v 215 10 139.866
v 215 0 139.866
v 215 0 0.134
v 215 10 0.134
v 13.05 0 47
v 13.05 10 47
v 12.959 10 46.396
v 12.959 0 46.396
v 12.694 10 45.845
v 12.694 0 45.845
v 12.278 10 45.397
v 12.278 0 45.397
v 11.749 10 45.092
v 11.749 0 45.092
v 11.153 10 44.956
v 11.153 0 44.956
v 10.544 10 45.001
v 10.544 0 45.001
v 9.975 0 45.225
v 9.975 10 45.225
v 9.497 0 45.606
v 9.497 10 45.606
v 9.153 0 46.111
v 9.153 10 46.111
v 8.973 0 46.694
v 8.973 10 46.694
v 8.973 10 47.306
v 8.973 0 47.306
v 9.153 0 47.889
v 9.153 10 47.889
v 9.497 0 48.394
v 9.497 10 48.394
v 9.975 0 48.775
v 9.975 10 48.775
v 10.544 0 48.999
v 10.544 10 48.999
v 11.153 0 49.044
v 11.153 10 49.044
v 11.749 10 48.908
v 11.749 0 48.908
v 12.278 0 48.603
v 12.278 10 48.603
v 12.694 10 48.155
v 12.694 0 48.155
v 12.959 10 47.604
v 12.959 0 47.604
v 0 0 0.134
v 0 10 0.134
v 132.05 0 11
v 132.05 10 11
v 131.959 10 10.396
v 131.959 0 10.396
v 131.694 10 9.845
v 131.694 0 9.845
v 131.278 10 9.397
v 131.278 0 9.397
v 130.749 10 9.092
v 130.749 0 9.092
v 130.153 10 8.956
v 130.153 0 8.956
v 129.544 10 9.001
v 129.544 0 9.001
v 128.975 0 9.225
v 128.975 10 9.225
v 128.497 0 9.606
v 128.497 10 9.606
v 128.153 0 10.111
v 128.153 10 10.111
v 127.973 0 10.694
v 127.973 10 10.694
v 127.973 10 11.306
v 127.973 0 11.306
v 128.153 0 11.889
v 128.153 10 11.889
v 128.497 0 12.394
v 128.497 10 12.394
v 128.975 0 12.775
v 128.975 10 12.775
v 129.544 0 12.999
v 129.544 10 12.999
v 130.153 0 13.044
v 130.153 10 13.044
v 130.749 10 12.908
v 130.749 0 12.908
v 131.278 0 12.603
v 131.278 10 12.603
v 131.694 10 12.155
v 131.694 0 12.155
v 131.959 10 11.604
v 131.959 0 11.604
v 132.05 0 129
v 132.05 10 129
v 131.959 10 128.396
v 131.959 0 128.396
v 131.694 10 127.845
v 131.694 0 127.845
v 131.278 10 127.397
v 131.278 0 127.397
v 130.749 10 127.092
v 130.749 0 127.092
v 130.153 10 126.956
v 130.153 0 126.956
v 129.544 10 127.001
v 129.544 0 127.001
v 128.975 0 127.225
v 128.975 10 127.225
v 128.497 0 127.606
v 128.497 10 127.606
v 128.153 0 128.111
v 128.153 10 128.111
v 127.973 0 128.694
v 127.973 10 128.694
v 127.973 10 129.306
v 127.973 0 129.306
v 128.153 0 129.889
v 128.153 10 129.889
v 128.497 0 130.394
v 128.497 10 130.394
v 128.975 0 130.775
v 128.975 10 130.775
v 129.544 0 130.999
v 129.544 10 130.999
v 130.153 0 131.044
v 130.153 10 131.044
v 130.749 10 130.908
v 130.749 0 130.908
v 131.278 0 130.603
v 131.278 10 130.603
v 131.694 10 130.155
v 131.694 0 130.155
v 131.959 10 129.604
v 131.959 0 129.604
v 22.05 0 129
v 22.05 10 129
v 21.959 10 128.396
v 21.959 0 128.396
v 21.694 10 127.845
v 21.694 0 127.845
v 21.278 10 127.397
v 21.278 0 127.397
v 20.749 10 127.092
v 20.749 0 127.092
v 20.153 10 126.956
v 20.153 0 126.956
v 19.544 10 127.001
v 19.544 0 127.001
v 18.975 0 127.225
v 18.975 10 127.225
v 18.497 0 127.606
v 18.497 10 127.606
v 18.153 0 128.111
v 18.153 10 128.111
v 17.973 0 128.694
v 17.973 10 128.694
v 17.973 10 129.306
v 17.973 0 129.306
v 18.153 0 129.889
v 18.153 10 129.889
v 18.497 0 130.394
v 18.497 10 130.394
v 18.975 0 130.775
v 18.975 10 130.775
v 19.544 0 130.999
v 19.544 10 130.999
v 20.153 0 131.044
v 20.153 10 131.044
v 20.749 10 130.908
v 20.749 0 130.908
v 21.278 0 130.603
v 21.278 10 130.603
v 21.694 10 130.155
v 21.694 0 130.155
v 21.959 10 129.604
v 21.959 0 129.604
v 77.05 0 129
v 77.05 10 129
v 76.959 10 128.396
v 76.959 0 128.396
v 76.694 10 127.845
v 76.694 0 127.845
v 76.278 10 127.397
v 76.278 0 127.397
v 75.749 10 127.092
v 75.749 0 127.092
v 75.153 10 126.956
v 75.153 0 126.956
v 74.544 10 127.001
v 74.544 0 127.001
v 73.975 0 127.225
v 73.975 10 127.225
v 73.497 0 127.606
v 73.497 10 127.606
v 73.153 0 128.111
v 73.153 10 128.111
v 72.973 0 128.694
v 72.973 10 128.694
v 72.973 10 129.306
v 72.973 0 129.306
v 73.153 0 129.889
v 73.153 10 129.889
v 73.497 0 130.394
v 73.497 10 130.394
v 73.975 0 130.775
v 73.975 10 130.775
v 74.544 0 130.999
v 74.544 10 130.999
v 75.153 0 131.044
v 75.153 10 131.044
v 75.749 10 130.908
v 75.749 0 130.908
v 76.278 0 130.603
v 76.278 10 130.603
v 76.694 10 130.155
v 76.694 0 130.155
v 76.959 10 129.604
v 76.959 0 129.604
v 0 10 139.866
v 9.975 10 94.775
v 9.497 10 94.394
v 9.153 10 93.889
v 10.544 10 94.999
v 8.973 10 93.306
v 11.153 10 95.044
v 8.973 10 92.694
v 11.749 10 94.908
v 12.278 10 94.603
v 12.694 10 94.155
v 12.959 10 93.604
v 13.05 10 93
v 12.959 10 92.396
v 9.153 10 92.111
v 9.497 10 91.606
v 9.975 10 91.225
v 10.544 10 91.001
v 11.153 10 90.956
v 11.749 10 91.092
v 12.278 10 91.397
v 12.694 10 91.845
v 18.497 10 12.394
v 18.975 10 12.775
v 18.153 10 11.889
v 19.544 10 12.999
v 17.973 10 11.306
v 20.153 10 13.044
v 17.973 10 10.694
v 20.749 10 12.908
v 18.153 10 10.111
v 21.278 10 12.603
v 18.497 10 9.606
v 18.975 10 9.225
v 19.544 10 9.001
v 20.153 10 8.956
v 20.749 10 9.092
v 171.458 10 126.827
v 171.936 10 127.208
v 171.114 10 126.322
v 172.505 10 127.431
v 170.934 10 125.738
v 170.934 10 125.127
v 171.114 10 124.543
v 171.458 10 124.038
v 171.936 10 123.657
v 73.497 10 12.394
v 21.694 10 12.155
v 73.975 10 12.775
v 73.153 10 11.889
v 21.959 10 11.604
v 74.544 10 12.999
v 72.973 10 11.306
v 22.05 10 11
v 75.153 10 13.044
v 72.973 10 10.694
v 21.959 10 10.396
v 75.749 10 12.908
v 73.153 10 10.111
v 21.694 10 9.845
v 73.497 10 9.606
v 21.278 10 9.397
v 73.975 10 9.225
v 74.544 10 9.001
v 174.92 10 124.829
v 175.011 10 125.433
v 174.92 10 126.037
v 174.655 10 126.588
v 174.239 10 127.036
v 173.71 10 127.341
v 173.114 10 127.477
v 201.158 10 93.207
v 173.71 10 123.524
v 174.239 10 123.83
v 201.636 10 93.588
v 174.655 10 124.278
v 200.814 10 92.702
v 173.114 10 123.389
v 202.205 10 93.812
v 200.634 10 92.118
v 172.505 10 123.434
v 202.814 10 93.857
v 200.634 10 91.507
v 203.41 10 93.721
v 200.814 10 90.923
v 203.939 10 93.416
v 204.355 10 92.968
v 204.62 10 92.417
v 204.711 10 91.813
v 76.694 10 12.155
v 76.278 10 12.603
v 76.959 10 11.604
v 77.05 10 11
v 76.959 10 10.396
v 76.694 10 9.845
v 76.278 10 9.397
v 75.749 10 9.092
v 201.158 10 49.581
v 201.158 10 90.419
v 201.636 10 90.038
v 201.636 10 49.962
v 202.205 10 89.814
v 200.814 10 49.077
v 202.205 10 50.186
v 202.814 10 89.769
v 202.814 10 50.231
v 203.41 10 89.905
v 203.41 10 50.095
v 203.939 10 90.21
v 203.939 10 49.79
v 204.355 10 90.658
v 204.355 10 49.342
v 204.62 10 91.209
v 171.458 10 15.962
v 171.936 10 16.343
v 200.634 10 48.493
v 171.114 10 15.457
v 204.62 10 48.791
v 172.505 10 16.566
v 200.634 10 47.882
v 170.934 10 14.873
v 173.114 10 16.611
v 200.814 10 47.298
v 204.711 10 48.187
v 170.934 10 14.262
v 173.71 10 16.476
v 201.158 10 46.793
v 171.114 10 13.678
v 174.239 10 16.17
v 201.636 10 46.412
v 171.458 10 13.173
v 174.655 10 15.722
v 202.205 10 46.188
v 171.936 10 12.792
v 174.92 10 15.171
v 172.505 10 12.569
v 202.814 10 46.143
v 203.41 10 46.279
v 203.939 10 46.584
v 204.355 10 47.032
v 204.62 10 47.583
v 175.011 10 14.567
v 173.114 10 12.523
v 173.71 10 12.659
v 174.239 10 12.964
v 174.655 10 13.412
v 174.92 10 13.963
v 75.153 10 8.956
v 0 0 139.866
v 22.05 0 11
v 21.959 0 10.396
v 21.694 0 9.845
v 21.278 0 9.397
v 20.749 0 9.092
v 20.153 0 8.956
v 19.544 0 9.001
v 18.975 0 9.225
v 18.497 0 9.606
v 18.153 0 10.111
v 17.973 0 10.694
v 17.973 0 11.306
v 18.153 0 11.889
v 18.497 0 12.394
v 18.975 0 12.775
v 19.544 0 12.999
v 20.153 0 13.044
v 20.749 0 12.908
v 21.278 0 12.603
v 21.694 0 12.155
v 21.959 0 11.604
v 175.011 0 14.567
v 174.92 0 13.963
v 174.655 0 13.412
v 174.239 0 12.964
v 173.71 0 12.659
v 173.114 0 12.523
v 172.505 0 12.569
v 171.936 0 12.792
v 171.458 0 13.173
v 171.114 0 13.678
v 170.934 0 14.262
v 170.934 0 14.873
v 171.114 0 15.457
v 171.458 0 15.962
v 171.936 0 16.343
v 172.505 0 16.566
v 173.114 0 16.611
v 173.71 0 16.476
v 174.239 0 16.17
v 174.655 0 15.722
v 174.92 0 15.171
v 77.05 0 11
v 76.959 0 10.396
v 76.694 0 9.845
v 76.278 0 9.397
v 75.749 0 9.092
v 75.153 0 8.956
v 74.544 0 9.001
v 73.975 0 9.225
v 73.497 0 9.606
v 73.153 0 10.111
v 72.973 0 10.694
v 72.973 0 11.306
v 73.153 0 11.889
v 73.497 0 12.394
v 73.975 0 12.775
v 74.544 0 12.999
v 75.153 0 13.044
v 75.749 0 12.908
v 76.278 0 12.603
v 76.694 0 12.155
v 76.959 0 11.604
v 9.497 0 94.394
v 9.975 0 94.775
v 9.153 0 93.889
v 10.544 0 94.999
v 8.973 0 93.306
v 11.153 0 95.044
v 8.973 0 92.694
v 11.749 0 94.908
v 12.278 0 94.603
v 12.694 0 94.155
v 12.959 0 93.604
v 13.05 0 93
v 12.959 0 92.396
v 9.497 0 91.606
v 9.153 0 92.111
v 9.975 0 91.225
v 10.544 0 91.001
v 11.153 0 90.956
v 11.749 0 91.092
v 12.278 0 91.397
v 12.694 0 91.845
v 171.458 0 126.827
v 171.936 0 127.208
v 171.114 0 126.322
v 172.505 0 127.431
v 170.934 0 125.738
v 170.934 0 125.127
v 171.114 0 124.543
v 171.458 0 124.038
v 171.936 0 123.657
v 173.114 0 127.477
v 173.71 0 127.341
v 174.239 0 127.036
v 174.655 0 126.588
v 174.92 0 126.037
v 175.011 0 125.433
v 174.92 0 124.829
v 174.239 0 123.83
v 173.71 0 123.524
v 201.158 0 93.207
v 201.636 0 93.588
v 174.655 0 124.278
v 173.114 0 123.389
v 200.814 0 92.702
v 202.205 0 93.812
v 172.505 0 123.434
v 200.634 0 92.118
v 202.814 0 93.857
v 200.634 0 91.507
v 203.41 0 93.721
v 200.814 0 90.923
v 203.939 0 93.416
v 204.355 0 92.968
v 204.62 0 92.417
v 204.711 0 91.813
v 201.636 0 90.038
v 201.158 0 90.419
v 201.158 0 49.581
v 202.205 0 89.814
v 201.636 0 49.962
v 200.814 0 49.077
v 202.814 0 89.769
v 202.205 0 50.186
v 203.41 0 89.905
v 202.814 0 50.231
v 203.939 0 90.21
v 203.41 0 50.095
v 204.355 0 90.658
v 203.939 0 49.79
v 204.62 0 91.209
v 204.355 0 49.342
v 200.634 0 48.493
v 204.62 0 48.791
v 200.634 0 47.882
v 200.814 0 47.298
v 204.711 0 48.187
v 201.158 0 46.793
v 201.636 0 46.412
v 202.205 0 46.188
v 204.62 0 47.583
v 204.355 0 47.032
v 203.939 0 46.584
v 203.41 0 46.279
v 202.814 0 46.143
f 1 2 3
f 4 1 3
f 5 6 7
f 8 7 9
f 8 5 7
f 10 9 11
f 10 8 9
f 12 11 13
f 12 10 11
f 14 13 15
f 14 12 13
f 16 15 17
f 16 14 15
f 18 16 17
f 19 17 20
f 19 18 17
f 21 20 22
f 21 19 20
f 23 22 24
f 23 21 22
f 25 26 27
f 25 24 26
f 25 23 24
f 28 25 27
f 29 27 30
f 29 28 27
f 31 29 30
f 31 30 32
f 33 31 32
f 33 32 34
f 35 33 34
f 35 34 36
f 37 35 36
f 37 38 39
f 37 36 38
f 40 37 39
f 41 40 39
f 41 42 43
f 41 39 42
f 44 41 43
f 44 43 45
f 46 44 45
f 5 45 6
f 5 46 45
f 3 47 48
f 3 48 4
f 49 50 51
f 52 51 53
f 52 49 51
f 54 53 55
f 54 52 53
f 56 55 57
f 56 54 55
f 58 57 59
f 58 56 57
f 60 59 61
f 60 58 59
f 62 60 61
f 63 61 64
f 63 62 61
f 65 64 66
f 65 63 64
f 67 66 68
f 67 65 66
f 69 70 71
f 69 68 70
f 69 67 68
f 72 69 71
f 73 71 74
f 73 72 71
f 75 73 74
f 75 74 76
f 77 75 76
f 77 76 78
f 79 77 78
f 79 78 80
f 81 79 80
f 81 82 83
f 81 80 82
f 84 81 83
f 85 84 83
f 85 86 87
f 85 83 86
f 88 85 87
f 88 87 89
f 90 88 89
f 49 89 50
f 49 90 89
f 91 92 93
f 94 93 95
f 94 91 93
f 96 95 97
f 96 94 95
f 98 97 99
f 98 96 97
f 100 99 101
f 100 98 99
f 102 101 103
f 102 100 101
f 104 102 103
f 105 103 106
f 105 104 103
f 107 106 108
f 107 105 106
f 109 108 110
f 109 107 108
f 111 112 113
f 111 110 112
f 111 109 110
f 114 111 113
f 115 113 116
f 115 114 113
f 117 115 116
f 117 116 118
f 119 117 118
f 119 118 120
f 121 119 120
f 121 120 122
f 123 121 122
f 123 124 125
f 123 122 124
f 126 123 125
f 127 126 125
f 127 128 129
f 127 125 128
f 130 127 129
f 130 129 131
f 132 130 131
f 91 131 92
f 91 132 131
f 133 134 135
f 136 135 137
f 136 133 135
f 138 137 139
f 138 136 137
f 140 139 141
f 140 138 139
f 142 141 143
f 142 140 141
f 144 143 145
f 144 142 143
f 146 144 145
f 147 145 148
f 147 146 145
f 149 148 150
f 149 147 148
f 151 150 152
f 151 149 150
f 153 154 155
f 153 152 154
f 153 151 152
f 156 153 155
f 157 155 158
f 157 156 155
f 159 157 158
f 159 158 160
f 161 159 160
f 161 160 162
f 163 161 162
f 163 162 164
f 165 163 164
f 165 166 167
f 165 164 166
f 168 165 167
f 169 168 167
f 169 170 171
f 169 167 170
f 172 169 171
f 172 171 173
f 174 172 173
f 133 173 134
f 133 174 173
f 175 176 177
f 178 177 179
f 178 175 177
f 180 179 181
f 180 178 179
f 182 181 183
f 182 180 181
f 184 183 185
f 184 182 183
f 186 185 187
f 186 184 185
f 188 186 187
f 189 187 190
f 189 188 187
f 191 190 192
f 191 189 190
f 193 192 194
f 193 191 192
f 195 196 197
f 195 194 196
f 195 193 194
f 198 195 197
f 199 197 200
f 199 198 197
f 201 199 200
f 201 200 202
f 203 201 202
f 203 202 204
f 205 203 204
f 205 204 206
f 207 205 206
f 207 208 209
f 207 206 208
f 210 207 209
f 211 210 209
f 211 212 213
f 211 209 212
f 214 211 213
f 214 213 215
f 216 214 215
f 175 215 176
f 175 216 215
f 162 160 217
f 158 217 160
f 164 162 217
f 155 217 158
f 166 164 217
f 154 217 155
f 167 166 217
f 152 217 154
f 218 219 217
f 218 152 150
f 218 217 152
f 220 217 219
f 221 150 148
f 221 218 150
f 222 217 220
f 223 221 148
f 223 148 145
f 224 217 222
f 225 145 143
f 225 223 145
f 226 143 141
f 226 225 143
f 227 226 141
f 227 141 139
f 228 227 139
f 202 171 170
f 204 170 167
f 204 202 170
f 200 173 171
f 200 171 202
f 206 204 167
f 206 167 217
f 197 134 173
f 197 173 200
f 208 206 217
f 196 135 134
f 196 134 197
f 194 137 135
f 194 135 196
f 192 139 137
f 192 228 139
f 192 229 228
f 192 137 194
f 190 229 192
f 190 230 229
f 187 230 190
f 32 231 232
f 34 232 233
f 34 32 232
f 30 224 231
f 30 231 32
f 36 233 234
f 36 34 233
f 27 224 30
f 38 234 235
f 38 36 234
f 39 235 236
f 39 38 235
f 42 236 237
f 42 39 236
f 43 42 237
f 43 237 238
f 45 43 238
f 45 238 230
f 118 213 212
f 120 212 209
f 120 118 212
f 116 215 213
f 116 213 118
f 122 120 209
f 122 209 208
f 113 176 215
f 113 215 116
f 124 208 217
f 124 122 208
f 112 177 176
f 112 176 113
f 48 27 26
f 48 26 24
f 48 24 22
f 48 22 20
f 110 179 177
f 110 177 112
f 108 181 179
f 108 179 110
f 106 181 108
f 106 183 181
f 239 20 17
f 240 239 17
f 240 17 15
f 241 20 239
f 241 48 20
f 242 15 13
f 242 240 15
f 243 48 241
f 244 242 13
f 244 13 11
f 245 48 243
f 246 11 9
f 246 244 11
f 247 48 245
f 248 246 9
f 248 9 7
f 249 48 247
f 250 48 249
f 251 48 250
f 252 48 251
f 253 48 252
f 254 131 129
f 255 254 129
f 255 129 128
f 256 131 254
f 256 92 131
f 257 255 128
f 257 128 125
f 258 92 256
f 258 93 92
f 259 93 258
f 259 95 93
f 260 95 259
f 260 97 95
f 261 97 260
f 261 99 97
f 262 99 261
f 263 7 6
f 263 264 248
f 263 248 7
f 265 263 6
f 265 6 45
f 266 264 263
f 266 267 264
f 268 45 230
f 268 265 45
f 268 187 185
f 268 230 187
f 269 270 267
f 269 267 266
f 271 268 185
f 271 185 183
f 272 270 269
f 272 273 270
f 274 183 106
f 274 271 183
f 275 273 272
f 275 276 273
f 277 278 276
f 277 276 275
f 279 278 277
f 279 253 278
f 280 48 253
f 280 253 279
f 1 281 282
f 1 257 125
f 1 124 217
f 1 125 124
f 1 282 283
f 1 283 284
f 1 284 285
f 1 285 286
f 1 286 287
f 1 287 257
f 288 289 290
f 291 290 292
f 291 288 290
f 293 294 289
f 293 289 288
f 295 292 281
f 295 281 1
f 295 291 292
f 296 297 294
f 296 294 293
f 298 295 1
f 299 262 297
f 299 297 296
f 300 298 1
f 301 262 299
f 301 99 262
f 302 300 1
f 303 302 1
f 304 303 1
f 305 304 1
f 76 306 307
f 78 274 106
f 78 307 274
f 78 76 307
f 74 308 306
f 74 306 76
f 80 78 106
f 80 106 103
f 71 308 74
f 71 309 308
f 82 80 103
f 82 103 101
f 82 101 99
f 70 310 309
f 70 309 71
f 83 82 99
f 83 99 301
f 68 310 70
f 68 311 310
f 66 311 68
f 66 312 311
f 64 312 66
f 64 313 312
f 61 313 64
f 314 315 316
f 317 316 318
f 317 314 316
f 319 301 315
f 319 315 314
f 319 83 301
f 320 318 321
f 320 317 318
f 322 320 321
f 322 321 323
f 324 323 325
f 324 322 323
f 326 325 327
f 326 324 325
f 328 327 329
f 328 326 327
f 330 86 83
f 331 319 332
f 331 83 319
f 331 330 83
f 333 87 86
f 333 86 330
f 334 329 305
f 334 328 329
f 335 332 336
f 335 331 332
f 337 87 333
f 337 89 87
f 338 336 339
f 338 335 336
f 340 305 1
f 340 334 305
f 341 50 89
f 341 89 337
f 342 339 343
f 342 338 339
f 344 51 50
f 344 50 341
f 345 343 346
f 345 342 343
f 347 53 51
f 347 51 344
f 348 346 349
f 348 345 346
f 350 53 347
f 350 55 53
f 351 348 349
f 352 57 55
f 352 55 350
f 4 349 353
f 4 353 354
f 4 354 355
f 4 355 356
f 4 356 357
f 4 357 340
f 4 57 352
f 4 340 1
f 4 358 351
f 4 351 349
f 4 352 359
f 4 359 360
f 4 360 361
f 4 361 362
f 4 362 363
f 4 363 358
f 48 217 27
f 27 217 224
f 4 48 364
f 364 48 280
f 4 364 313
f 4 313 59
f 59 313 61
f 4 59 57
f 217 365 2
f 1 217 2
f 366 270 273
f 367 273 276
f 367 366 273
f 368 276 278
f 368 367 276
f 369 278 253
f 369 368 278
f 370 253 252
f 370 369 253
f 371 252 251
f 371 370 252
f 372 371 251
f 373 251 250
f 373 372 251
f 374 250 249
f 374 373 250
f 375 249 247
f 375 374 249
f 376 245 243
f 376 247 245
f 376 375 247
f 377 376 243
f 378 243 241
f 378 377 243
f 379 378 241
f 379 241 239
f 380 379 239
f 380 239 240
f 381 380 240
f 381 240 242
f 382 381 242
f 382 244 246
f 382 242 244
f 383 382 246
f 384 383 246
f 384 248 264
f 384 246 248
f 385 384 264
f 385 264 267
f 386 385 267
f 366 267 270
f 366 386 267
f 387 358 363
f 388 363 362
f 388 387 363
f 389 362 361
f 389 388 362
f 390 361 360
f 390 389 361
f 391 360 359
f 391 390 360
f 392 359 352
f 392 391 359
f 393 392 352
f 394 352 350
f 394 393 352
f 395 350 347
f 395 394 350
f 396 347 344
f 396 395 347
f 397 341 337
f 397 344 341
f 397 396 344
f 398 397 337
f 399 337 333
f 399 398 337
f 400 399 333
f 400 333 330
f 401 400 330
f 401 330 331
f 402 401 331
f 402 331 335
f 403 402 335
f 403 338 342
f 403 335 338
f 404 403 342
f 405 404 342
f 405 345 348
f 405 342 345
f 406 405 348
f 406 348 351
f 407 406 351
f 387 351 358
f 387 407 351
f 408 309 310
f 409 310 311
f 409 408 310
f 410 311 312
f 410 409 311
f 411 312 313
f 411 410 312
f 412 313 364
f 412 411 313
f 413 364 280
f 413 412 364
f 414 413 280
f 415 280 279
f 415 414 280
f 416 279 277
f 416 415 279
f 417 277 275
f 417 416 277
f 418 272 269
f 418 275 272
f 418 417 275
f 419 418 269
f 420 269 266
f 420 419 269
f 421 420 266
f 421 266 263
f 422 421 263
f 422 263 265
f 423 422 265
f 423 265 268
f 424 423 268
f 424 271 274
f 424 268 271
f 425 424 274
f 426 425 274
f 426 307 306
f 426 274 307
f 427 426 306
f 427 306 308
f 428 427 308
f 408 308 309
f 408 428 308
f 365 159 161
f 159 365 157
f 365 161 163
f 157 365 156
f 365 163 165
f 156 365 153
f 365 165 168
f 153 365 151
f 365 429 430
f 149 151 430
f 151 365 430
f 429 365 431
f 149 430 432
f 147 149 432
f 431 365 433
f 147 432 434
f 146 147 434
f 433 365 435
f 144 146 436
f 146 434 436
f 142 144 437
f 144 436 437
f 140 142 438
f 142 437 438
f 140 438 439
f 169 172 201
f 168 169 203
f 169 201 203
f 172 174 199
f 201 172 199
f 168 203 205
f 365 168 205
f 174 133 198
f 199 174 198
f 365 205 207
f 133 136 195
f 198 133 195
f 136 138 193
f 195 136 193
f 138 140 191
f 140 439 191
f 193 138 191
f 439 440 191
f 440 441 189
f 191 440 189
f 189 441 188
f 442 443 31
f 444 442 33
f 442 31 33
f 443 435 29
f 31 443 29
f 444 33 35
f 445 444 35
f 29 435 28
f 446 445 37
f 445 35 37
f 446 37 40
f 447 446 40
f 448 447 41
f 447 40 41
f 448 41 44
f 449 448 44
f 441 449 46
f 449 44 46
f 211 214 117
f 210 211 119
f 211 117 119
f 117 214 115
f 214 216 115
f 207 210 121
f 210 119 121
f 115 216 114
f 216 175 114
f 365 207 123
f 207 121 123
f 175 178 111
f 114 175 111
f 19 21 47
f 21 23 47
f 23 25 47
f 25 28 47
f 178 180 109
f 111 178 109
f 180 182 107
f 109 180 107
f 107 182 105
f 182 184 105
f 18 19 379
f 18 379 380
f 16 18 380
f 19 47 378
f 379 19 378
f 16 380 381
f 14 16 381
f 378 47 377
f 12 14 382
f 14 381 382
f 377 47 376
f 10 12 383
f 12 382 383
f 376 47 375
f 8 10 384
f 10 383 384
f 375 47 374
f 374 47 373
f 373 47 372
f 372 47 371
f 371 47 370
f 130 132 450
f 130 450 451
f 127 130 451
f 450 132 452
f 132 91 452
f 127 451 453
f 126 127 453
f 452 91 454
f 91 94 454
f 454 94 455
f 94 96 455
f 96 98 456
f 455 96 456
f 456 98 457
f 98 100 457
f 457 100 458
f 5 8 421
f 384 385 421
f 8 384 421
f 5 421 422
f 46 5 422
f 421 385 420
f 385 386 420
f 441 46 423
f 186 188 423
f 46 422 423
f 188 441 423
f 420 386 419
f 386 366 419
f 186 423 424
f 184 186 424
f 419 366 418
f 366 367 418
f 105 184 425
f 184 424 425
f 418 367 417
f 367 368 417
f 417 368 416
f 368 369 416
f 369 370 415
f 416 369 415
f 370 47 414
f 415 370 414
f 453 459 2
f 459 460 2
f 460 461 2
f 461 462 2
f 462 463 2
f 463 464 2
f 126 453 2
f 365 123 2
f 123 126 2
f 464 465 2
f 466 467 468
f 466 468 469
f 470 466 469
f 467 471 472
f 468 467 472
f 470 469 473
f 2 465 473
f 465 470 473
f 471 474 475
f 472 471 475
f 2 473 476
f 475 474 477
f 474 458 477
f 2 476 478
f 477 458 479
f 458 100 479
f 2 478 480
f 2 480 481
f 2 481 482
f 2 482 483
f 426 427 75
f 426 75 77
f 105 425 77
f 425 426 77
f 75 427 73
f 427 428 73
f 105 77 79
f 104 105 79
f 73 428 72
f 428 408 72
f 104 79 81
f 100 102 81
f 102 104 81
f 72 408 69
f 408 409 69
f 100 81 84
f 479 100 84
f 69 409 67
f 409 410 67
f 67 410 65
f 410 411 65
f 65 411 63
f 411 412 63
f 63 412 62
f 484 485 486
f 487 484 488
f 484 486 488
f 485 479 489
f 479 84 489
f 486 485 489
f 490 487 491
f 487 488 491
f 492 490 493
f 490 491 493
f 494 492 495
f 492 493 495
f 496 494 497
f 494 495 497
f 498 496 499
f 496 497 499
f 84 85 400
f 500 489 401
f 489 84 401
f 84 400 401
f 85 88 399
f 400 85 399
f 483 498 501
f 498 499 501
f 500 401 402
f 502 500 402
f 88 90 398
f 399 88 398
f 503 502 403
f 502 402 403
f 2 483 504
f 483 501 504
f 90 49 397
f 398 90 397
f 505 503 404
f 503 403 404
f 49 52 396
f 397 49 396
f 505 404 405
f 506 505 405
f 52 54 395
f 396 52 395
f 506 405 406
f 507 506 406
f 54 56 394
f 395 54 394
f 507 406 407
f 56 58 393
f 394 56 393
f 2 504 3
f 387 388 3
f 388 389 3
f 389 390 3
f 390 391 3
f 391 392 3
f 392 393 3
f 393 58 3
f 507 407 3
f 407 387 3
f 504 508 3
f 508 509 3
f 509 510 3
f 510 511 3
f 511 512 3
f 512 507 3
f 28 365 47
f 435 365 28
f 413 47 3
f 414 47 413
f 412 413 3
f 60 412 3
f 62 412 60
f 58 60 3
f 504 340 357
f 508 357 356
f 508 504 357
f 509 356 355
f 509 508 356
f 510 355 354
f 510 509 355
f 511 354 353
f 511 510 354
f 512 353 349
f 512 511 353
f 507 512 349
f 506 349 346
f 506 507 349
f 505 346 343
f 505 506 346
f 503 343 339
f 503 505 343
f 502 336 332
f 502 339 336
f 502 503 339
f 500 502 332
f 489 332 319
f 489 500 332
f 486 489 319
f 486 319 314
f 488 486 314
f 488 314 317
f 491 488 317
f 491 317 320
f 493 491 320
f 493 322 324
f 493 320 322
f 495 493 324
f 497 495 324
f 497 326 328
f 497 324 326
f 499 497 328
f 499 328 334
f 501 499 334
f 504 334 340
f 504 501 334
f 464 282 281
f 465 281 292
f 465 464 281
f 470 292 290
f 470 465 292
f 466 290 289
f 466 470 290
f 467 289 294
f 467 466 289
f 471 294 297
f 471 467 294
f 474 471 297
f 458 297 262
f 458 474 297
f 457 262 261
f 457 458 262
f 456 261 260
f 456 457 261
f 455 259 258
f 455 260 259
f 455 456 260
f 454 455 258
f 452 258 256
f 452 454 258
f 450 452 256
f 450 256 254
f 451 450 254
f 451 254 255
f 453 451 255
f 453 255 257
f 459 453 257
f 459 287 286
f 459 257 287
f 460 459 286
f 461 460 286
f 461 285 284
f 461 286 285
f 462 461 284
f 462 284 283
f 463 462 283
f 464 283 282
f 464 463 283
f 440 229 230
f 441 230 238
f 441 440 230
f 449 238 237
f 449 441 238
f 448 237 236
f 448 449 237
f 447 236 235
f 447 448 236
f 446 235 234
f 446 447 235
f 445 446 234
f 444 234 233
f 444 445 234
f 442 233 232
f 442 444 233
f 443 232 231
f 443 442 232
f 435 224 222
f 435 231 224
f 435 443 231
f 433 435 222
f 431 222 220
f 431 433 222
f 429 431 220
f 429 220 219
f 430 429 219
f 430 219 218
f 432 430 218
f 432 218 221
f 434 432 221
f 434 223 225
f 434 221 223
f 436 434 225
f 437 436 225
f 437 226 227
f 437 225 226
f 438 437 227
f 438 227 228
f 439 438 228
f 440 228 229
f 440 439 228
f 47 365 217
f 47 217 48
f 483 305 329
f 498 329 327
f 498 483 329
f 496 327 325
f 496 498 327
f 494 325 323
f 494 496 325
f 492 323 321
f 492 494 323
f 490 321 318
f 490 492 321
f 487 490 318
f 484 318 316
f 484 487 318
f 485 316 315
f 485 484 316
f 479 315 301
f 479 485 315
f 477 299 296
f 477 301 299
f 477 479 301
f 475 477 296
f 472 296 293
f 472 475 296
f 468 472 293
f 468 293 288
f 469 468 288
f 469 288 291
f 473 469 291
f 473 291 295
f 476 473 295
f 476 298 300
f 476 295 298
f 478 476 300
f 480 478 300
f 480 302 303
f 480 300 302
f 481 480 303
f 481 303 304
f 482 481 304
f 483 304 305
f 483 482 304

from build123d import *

# Parameters (mm, degrees)
SKETCH2_W               = 215
SKETCH2_H               = 139.732878208
BOSS_EXTRUDE1_DEPTH     = 10
SKETCH3_R               = 2.04999698
SKETCH3_R_2             = 2.049996201
SKETCH3_R_3             = 2.049998036
SKETCH3_R_4             = 2.05000301
SKETCH3_R_5             = 2.05000489
SKETCH3_R_6             = 2.05000167
SKETCH3_R_7             = 2.049998726
SKETCH3_R_8             = 2.050000522
SKETCH3_R_9             = 2.050000228
SKETCH3_R_10            = 2.050000557
SKETCH3_R_11            = 2.050001917
SKETCH3_R_12            = 2.050001502
CUT_EXTRUDE2_DEPTH      = 11
CUT_EXTRUDE2_DEPTH_BACK = 1


with BuildPart() as part:
    # Sketch2 → Boss-Extrude1 (new body)
    with BuildSketch(Plane(origin=(0, 0, 0), x_dir=(1, 0, 0), z_dir=(0, 1, 0))):
        with Locations((107.5, -70)):
            Rectangle(SKETCH2_W, SKETCH2_H)
    extrude(amount=BOSS_EXTRUDE1_DEPTH)

    # Sketch3 → Cut-Extrude2 (cut, two sides)
    with BuildSketch(Plane(origin=(0, 0, 0), x_dir=(1, 0, 0), z_dir=(0, 1, 0))) as cut_extrude2_sk:
        with Locations((20.000003077, -129.000001764)):
            Circle(SKETCH3_R)
        with Locations((74.999999742, -129.000001144)):
            Circle(SKETCH3_R_2)
        with Locations((130.000001864, -128.999997495)):
            Circle(SKETCH3_R_3)
        with Locations((172.961008424, -125.432773785)):
            Circle(SKETCH3_R_4)
        with Locations((202.661132812, -91.812960049)):
            Circle(SKETCH3_R_5)
        with Locations((202.661143569, -48.187042941)):
            Circle(SKETCH3_R_6)
        with Locations((172.961008675, -14.567229705)):
            Circle(SKETCH3_R_7)
        with Locations((130.000001694, -10.999999378)):
            Circle(SKETCH3_R_8)
        with Locations((75.000000263, -10.999999084)):
            Circle(SKETCH3_R_9)
        with Locations((20.000004874, -11.000001196)):
            Circle(SKETCH3_R_10)
        with Locations((10.999999837, -47.000000994)):
            Circle(SKETCH3_R_11)
        with Locations((11.000000285, -93.0000014)):
            Circle(SKETCH3_R_12)
    extrude(amount=CUT_EXTRUDE2_DEPTH, mode=Mode.SUBTRACT)
    extrude(cut_extrude2_sk.sketch, amount=-CUT_EXTRUDE2_DEPTH_BACK, mode=Mode.SUBTRACT)


solid = part.part
